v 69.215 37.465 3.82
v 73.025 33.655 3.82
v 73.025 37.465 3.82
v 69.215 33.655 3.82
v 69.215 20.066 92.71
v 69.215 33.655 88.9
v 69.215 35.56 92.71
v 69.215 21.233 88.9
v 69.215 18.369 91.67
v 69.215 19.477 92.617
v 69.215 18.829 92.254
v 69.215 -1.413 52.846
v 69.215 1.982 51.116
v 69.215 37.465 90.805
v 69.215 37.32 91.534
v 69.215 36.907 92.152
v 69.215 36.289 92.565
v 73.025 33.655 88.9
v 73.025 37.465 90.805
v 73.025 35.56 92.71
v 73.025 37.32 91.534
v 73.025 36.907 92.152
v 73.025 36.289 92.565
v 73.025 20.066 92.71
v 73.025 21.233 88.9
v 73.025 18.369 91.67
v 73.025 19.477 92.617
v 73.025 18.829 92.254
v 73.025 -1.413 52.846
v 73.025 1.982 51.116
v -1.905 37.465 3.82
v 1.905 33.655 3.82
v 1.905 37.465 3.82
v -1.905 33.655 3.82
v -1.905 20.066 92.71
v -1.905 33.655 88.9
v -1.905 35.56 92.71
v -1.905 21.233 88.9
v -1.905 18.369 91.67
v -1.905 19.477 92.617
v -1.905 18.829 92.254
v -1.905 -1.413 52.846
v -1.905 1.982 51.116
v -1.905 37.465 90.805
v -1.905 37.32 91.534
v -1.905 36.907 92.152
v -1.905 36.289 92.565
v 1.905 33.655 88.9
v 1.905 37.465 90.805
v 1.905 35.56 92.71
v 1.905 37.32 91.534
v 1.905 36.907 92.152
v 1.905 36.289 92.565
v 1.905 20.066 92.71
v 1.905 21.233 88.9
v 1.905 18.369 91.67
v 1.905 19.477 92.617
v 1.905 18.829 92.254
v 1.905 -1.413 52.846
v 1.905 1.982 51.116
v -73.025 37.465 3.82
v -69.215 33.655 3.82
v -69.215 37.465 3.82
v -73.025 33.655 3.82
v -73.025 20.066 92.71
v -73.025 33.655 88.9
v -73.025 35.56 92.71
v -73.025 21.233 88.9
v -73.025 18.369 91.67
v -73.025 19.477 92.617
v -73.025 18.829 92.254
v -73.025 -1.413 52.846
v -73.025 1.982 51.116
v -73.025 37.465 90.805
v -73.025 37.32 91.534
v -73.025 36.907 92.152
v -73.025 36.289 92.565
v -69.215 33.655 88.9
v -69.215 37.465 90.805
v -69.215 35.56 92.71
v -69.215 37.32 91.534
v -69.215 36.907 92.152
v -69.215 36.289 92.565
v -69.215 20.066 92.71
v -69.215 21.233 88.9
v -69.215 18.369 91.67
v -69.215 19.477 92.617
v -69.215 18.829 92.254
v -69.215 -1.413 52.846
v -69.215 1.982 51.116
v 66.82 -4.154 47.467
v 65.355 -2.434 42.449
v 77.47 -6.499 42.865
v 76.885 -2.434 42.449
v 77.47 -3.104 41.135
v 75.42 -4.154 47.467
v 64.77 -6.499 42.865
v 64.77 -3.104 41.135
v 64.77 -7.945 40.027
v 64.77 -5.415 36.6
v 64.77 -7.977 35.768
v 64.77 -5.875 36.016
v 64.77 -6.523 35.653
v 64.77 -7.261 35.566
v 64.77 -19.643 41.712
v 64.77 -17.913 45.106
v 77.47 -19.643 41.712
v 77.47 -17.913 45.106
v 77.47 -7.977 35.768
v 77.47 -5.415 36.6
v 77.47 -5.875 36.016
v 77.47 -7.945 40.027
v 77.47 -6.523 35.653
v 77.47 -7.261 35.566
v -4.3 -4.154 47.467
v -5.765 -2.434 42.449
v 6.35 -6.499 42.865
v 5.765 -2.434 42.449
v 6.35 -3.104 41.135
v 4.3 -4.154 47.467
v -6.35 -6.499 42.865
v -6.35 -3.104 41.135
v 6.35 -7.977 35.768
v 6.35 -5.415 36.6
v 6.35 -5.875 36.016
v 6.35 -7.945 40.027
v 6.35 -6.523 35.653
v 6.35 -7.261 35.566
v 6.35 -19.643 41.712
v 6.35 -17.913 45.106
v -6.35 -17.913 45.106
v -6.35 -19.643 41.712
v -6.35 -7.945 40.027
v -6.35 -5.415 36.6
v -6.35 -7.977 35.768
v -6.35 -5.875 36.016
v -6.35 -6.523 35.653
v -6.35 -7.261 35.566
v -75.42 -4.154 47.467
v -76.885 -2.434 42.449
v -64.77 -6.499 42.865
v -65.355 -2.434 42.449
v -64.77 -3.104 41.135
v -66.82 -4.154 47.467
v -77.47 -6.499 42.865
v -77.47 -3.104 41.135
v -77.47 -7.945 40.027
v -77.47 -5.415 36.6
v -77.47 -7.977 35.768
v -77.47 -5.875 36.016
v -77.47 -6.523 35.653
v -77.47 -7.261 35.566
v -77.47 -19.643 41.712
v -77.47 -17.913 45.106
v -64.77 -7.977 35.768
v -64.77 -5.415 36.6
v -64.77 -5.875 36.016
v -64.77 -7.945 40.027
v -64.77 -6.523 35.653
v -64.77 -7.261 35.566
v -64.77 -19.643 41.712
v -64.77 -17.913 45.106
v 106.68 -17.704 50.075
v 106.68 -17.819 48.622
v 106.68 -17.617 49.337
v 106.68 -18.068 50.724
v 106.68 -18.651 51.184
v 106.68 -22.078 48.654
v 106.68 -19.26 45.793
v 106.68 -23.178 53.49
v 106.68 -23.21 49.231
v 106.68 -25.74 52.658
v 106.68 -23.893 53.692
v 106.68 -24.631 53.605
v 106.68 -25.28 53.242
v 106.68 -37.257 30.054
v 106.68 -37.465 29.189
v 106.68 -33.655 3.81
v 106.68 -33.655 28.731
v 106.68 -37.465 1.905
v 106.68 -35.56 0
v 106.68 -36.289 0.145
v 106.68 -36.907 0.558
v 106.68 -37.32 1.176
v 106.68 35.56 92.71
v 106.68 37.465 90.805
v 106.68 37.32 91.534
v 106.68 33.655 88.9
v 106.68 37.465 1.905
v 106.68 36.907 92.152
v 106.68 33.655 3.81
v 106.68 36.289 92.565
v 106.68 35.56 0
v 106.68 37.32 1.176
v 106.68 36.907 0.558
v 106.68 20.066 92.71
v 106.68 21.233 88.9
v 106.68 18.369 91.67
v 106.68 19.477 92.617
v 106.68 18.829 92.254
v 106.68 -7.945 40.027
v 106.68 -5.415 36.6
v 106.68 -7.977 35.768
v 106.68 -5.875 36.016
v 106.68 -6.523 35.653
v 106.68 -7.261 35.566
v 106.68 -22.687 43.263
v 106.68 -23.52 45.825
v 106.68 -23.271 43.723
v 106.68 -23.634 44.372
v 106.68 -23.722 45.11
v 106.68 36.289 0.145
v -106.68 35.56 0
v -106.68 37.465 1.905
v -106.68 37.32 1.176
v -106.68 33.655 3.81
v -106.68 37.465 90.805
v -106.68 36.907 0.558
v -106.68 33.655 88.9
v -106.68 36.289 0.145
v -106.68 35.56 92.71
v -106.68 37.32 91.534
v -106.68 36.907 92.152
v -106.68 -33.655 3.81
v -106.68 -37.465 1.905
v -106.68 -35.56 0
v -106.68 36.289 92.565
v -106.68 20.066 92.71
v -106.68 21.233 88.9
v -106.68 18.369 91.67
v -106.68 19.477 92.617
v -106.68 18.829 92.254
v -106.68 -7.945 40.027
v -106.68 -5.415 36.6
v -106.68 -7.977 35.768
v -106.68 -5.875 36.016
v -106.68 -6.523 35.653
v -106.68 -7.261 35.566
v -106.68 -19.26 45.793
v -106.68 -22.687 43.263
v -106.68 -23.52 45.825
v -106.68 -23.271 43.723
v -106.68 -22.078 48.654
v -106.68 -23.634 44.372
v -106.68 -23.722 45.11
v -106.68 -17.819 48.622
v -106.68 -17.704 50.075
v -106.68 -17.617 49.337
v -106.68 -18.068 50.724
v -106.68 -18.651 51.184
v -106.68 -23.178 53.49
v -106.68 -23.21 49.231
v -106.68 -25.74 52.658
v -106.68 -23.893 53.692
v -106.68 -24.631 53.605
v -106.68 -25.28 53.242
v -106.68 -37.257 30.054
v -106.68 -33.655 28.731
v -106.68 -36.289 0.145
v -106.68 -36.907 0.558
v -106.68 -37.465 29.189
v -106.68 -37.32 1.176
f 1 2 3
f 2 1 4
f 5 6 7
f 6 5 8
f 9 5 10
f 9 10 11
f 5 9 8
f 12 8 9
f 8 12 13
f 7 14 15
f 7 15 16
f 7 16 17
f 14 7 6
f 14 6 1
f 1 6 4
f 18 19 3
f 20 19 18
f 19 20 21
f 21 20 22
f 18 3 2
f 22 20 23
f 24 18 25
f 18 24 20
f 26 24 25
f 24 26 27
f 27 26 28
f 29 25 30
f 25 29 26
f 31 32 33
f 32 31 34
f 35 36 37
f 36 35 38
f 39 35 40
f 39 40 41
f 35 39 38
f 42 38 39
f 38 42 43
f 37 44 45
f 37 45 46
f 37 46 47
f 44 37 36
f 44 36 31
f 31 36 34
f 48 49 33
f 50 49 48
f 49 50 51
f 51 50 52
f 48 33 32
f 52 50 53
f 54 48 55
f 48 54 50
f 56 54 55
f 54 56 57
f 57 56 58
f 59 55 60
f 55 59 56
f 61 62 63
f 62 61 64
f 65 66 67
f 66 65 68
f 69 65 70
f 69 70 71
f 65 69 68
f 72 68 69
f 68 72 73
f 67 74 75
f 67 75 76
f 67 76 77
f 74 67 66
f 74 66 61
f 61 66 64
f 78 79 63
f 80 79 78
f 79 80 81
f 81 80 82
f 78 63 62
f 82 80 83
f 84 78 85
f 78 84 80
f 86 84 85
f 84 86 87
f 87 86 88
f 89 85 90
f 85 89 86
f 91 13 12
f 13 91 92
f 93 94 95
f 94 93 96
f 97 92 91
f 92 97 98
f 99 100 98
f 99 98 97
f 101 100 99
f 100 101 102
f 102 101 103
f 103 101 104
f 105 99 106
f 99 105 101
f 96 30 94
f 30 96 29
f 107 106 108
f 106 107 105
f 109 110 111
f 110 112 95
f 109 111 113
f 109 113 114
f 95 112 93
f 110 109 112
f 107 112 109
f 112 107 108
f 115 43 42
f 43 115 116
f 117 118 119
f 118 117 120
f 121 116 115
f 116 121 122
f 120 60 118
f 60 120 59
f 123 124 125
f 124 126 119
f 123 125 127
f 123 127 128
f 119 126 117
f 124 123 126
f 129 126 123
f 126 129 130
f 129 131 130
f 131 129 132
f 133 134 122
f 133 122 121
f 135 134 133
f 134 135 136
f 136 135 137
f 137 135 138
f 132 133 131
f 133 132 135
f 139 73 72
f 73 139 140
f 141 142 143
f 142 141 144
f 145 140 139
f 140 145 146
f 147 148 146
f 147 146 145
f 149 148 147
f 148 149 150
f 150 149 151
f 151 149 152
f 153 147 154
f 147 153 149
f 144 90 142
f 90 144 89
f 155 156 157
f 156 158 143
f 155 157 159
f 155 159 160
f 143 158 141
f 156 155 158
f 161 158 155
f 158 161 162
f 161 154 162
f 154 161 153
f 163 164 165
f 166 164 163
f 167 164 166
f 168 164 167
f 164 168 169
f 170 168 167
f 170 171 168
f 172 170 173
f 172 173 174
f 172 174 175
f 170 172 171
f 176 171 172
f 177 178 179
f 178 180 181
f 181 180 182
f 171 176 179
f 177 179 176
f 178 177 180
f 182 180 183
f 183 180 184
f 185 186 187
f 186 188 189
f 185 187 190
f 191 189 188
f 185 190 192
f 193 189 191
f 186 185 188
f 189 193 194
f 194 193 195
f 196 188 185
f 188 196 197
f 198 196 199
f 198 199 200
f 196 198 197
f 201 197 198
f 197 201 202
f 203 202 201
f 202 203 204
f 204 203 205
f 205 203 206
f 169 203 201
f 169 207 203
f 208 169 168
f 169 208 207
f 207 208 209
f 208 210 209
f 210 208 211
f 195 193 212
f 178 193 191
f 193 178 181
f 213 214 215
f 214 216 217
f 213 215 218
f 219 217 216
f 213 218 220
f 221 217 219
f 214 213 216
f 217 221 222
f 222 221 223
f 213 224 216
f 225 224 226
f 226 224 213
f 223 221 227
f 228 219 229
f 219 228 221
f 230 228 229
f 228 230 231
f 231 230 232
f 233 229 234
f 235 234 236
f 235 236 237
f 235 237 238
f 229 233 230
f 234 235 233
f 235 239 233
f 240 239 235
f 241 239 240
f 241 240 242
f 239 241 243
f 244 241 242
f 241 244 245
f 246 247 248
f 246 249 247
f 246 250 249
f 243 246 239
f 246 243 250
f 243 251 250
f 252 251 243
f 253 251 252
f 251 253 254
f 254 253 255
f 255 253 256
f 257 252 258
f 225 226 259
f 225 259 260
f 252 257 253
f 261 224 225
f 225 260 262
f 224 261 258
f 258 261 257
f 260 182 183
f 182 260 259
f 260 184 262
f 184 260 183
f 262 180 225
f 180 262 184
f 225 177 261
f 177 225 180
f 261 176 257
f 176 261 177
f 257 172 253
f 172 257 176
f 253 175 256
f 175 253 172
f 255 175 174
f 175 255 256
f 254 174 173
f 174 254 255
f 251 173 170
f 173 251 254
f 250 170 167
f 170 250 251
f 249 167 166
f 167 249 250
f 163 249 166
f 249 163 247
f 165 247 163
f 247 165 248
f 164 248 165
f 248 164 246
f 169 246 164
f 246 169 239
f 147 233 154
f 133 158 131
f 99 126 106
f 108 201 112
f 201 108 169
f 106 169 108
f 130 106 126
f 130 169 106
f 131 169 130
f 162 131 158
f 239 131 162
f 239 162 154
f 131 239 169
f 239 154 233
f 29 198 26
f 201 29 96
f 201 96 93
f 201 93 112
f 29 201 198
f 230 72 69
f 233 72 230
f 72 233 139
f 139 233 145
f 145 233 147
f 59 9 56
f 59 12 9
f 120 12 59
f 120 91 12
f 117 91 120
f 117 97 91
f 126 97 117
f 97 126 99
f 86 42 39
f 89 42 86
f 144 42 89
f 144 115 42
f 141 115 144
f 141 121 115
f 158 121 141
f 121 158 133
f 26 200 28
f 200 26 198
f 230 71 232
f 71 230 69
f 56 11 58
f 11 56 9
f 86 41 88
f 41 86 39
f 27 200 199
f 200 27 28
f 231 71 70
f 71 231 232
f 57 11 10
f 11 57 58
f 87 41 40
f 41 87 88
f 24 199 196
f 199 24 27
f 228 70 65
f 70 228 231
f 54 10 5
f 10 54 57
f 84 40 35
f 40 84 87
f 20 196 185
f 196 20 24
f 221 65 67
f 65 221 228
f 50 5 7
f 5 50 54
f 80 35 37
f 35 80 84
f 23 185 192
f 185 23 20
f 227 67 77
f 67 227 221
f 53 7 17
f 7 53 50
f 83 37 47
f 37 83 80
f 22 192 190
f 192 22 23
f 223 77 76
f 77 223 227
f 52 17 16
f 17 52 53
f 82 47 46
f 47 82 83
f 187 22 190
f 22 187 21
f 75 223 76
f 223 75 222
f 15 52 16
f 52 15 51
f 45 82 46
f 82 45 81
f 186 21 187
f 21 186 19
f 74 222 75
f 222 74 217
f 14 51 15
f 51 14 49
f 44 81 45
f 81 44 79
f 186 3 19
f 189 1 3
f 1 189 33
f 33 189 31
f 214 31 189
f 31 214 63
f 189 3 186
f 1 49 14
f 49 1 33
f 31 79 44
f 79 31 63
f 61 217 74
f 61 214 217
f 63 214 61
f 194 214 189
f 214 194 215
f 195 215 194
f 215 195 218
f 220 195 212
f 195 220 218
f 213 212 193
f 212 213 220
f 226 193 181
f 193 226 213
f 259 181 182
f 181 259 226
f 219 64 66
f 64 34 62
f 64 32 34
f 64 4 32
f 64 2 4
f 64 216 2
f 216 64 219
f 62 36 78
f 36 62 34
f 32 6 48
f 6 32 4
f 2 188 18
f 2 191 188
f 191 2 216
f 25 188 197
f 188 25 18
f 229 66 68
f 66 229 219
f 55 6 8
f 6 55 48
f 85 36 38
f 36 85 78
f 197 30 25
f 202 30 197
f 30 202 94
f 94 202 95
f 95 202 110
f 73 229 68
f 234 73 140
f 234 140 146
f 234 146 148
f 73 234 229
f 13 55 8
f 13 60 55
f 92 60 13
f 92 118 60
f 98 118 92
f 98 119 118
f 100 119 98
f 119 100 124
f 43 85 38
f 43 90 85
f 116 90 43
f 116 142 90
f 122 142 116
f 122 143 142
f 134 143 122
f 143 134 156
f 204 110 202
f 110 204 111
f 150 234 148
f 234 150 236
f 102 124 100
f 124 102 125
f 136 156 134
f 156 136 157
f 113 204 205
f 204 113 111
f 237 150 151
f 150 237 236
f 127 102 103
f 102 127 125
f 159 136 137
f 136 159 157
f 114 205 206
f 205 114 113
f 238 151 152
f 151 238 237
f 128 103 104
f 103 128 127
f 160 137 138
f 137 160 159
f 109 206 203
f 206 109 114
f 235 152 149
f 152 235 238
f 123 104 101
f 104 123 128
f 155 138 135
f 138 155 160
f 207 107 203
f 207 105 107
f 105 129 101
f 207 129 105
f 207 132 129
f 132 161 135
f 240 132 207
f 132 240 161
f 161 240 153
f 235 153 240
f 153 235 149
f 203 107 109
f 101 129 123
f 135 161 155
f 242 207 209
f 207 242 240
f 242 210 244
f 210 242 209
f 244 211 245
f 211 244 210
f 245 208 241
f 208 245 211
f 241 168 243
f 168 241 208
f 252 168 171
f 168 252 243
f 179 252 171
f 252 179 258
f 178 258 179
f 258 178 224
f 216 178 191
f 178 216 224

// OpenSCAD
// 
// Customizable Phone Stand
// version 1.0   11/21/2015
// by Steve Van Ausdall (DaoZenCiaoYen @ Thingiverse)
//

// preview[view:west, tilt:top diagonal]

/* [Main] */
// in inches
stand_height = 3.5 ; // [2:0.1:5]
// in inches
stand_width = 2.8 ; // [2:0.1:5]
// in inches
stand_depth = 2.8 ; // [2:0.1:5]
// in inches
phone_depth = 0.5 ; // [0.3:0.1:1]
// in inches
phone_lip = 0.2 ; // [0:0.1:0.5]
// in degrees
phone_angle = 27 ; // [10:35]
// in percent of stand depth
phone_adjust_depth_pct = 10 ; // [-20:1:10]
// in percent of stand height
phone_adjust_height_pct = -10 ; // [-20:1:10]
// the hole for the charger connetor in inches
charger_width = 0.5 ; // [0:0.1:1.5]
// the width of the charger cord in inches
cord_width = 0.15 ; // [0:0.05:1.5]
// in percent of possible height
slot_taper_pct = 30 ; // [0:5:100]
// in inches
wall_thickness = 0.15 ; // [0.1:0.05:0.5]
// number of phones
phone_count = 3; // [1:1:10]

/* [Hidden] */
mm_in = 25.4 ;
thick = mm(wall_thickness) ;
phone_y = (stand_height/2) + (phone_adjust_height_pct*stand_height/100) ;
phone_x = (stand_depth/2) + (phone_adjust_depth_pct*stand_depth/100) ;
slot_taper = (stand_height - phone_y) * slot_taper_pct/100 ;
ff = 0.01 ;
bf = 1 ;
$fn=16 ;

function mm(in) = in * mm_in ;

main();

module main()
{
  render(convexity = 3)
  {
    rotate_z(2)
    {
      difference()
      {
        stand();
        cord_slots();
        charger_slots();
      }
    }
  }
}

module rotate_z(yn)
{
  if (yn == 0) 
  {
    children(0);
  }
  else if (yn == 1)
  {
    rotate([0,0,180])
      translate([mm(-stand_depth/2),mm(-stand_height/2)-thick/2,mm(stand_width/2)])
      children(0);
  }
  else 
  {
    rotate([0,0,-90])
      translate([mm(-stand_depth/2),0,thick/2])
      rotate([90,0,0])
      children(0) ;
  }
}

module cord_slots()
{
  for (slot = [0:phone_count-1])
    cord_slot(slot);
}

module cord_slot(slot)
{
  offset = (stand_width * slot) - ((phone_count - 1) * stand_width * 0.5);
  translate([-thick,thick*1.5+ff,mm(offset -cord_width/2)])
    linear_extrude(height=mm(cord_width)) 
    offset(thick) 
    cord_slot_shape();
}

module charger_slots()
{
  for (slot = [0:phone_count-1])
    charger_slot(slot);
}

module charger_slot(slot)
{
  offset = (stand_width * slot) - ((phone_count - 1) * stand_width * 0.5);
  translate([mm(phone_x)-thick/2,mm(phone_y)-thick,mm(offset)])
    rotate([0,0,phone_angle])
    rotate([0,90,0])
    linear_extrude(height=mm(phone_depth)+thick+ff)
    polygon(points=[
      [0,mm(slot_taper)+thick*2],
      [mm(charger_width/2),thick*2],[mm(charger_width/2),0],
      [-mm(charger_width/2),0],[-mm(charger_width/2),thick*2]
    ]);
}

module stand()
{
  translate([0,0,mm(-(stand_width * phone_count) /2)])
    linear_extrude(height=mm(stand_width * phone_count)) 
    stand_outline();
}

module stand_outline()
{
  difference()
  {
    offset(r=thick/2) stand_shape();
    offset(r=-thick/2) stand_shape();
  }
}

module cord_slot_shape()
{
  square([mm(phone_x)+thick/2,mm(stand_height)]);
}

module stand_shape()
{
  difference()
  {
    square([mm(stand_depth),mm(stand_height)]);
    translate([mm(phone_x),mm(phone_y)])
      rotate([0,0,phone_angle])
      translate([0,mm(-phone_y-bf)])
      difference()
      {
        square([mm(stand_depth+bf),mm(stand_height+bf*2)]);
        square([mm(phone_depth)+thick,mm(phone_y+bf)]);
        translate([mm(phone_depth)+thick,0])
          square([mm(phone_lip),mm(phone_y+bf+phone_lip)]);
      };
  }
}
